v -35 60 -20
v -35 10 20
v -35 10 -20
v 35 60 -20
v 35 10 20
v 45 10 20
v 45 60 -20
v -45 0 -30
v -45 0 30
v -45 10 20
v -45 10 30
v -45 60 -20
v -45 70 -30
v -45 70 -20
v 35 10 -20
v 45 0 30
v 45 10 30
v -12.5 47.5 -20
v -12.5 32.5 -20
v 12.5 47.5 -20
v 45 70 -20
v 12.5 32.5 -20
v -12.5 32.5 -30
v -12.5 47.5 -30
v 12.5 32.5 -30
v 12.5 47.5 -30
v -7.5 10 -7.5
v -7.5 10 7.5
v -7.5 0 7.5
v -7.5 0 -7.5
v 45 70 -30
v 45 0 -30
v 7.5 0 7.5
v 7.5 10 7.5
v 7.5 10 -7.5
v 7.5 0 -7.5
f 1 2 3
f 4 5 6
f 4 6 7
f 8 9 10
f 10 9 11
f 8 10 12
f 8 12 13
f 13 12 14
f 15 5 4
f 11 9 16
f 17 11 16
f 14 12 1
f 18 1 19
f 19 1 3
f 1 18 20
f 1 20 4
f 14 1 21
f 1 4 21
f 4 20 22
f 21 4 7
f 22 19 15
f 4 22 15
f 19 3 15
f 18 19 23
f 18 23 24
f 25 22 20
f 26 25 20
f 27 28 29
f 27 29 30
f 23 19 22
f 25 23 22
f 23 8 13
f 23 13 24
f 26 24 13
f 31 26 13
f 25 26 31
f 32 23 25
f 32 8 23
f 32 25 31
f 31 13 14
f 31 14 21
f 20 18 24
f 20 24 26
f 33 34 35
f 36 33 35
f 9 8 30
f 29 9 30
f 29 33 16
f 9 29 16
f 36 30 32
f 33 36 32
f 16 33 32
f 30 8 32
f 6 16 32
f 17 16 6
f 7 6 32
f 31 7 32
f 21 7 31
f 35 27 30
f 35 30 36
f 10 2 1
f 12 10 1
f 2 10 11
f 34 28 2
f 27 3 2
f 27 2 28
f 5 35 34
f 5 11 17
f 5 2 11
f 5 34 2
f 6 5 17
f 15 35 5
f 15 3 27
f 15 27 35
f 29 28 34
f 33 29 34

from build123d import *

# Parameters (mm, degrees)
SKETCH1_W           = 90
SKETCH1_H           = 60
BOSS_EXTRUDE1_DEPTH = 10
SKETCH2_W           = 90
SKETCH2_H           = 10
BOSS_EXTRUDE2_DEPTH = 60
SKETCH3_W           = 25
SKETCH3_H           = 15
CUT_EXTRUDE1_DEPTH  = 10
SKETCH5_W           = 15
SKETCH5_H           = 15
CUT_EXTRUDE2_DEPTH  = 10
RIB1_REACH          = 119.898
SKETCH6_WALL_W      = 301.827764826
SKETCH6_WALL_H      = 10


with BuildPart() as part:
    # Sketch1 → Boss-Extrude1 (new body)
    with BuildSketch(Plane(origin=(0, 0, 0), x_dir=(1, 0, 0), z_dir=(0, 1, 0))):
        Rectangle(SKETCH1_W, SKETCH1_H)
    extrude(amount=BOSS_EXTRUDE1_DEPTH)

    # Sketch2 → Boss-Extrude2 (add)
    with BuildSketch(Plane(origin=(0, 10, 0), x_dir=(1, 0, 0), z_dir=(0, 1, 0))):
        with Locations((0, 25)):
            Rectangle(SKETCH2_W, SKETCH2_H)
    extrude(amount=BOSS_EXTRUDE2_DEPTH)

    # Sketch3 → Cut-Extrude1 (cut)
    with BuildSketch(Plane.XY.offset(-20)):
        with Locations((0, 40)):
            Rectangle(SKETCH3_W, SKETCH3_H)
    extrude(amount=-CUT_EXTRUDE1_DEPTH, mode=Mode.SUBTRACT)

    # Sketch5 → Cut-Extrude2 (cut)
    with BuildSketch(Plane(origin=(0, 10, 0), x_dir=(1, 0, 0), z_dir=(0, 1, 0))):
        Rectangle(SKETCH5_W, SKETCH5_H)
    extrude(amount=-CUT_EXTRUDE2_DEPTH, mode=Mode.SUBTRACT)

    # Sketch6 wall → Rib1 (add, up to next)
    with BuildSketch(Plane(origin=(-45, 35, 0), x_dir=(0, 0.780868809443, -0.624695047554), z_dir=(0, -0.624695047554, -0.780868809443)), mode=Mode.PRIVATE) as rib1_sk1:
        with Locations((0, 5)):
            Rectangle(SKETCH6_WALL_W, SKETCH6_WALL_H)
    rib1_tool1 = extrude(rib1_sk1.sketch, amount=RIB1_REACH, mode=Mode.PRIVATE) - part.part
    rib1 = rib1_tool1.solids().sort_by_distance((-45, 35, 0))[0]
    add(rib1)

    # Mirror1: Rib1 across plane
    add(rib1.mirror(Plane(origin=(0, 0, 0), x_dir=(0, 0, 1), z_dir=(1, 0, 0))))


solid = part.part
